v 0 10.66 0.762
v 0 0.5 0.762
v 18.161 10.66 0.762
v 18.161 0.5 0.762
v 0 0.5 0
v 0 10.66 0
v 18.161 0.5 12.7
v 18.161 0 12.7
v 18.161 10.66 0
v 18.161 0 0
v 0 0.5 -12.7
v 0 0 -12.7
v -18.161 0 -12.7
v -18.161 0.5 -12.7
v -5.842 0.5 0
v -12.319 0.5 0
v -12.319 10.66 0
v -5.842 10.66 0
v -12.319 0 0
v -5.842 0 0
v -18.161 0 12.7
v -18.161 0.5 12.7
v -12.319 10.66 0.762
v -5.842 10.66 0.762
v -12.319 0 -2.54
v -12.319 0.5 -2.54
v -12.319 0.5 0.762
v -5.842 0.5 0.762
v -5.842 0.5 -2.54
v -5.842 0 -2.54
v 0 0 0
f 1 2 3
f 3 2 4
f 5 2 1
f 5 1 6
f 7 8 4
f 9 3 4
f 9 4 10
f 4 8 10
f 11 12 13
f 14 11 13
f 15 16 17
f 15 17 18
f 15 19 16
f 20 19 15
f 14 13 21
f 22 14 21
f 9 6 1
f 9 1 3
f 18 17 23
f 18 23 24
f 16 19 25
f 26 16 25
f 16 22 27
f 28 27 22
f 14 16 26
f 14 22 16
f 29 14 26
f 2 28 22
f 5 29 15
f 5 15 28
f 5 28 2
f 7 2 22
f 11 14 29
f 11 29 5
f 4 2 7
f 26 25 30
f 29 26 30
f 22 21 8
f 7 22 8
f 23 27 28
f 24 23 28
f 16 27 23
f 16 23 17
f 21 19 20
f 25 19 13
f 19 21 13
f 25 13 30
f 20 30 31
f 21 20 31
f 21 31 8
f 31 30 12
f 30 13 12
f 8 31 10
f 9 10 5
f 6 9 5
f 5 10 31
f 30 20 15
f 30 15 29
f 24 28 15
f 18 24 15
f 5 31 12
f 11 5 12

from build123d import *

# Parameters (mm, degrees)
SKETCH1_W           = 6.477
SKETCH1_H           = 2.54
BOSS_EXTRUDE1_DEPTH = 0.5
SKETCH2_W           = 6.477
SKETCH2_H           = 0.762
SKETCH2_W_2         = 18.161
BOSS_EXTRUDE2_DEPTH = 10.16


with BuildPart() as part:
    # Sketch1 → Boss-Extrude1 (new body)
    with BuildSketch(Plane(origin=(0, 0, 0), x_dir=(1, 0, 0), z_dir=(0, 1, 0))):
        Polygon((-18.161, -12.7), (18.161, -12.7), (18.161, 0), (0, 0), (0, 12.7), (-18.161, 12.7), align=None)
        with Locations((-9.0805, 1.27)):
            Rectangle(SKETCH1_W, SKETCH1_H, mode=Mode.SUBTRACT)
    extrude(amount=BOSS_EXTRUDE1_DEPTH)

    # Sketch2 → Boss-Extrude2 (add)
    with BuildSketch(Plane(origin=(0, 0.5, 0), x_dir=(1, 0, 0), z_dir=(0, 1, 0))):
        with Locations((-9.0805, -0.381)):
            Rectangle(SKETCH2_W, SKETCH2_H)
        with Locations((9.0805, -0.381)):
            Rectangle(SKETCH2_W_2, SKETCH2_H)
    extrude(amount=BOSS_EXTRUDE2_DEPTH)


solid = part.part
